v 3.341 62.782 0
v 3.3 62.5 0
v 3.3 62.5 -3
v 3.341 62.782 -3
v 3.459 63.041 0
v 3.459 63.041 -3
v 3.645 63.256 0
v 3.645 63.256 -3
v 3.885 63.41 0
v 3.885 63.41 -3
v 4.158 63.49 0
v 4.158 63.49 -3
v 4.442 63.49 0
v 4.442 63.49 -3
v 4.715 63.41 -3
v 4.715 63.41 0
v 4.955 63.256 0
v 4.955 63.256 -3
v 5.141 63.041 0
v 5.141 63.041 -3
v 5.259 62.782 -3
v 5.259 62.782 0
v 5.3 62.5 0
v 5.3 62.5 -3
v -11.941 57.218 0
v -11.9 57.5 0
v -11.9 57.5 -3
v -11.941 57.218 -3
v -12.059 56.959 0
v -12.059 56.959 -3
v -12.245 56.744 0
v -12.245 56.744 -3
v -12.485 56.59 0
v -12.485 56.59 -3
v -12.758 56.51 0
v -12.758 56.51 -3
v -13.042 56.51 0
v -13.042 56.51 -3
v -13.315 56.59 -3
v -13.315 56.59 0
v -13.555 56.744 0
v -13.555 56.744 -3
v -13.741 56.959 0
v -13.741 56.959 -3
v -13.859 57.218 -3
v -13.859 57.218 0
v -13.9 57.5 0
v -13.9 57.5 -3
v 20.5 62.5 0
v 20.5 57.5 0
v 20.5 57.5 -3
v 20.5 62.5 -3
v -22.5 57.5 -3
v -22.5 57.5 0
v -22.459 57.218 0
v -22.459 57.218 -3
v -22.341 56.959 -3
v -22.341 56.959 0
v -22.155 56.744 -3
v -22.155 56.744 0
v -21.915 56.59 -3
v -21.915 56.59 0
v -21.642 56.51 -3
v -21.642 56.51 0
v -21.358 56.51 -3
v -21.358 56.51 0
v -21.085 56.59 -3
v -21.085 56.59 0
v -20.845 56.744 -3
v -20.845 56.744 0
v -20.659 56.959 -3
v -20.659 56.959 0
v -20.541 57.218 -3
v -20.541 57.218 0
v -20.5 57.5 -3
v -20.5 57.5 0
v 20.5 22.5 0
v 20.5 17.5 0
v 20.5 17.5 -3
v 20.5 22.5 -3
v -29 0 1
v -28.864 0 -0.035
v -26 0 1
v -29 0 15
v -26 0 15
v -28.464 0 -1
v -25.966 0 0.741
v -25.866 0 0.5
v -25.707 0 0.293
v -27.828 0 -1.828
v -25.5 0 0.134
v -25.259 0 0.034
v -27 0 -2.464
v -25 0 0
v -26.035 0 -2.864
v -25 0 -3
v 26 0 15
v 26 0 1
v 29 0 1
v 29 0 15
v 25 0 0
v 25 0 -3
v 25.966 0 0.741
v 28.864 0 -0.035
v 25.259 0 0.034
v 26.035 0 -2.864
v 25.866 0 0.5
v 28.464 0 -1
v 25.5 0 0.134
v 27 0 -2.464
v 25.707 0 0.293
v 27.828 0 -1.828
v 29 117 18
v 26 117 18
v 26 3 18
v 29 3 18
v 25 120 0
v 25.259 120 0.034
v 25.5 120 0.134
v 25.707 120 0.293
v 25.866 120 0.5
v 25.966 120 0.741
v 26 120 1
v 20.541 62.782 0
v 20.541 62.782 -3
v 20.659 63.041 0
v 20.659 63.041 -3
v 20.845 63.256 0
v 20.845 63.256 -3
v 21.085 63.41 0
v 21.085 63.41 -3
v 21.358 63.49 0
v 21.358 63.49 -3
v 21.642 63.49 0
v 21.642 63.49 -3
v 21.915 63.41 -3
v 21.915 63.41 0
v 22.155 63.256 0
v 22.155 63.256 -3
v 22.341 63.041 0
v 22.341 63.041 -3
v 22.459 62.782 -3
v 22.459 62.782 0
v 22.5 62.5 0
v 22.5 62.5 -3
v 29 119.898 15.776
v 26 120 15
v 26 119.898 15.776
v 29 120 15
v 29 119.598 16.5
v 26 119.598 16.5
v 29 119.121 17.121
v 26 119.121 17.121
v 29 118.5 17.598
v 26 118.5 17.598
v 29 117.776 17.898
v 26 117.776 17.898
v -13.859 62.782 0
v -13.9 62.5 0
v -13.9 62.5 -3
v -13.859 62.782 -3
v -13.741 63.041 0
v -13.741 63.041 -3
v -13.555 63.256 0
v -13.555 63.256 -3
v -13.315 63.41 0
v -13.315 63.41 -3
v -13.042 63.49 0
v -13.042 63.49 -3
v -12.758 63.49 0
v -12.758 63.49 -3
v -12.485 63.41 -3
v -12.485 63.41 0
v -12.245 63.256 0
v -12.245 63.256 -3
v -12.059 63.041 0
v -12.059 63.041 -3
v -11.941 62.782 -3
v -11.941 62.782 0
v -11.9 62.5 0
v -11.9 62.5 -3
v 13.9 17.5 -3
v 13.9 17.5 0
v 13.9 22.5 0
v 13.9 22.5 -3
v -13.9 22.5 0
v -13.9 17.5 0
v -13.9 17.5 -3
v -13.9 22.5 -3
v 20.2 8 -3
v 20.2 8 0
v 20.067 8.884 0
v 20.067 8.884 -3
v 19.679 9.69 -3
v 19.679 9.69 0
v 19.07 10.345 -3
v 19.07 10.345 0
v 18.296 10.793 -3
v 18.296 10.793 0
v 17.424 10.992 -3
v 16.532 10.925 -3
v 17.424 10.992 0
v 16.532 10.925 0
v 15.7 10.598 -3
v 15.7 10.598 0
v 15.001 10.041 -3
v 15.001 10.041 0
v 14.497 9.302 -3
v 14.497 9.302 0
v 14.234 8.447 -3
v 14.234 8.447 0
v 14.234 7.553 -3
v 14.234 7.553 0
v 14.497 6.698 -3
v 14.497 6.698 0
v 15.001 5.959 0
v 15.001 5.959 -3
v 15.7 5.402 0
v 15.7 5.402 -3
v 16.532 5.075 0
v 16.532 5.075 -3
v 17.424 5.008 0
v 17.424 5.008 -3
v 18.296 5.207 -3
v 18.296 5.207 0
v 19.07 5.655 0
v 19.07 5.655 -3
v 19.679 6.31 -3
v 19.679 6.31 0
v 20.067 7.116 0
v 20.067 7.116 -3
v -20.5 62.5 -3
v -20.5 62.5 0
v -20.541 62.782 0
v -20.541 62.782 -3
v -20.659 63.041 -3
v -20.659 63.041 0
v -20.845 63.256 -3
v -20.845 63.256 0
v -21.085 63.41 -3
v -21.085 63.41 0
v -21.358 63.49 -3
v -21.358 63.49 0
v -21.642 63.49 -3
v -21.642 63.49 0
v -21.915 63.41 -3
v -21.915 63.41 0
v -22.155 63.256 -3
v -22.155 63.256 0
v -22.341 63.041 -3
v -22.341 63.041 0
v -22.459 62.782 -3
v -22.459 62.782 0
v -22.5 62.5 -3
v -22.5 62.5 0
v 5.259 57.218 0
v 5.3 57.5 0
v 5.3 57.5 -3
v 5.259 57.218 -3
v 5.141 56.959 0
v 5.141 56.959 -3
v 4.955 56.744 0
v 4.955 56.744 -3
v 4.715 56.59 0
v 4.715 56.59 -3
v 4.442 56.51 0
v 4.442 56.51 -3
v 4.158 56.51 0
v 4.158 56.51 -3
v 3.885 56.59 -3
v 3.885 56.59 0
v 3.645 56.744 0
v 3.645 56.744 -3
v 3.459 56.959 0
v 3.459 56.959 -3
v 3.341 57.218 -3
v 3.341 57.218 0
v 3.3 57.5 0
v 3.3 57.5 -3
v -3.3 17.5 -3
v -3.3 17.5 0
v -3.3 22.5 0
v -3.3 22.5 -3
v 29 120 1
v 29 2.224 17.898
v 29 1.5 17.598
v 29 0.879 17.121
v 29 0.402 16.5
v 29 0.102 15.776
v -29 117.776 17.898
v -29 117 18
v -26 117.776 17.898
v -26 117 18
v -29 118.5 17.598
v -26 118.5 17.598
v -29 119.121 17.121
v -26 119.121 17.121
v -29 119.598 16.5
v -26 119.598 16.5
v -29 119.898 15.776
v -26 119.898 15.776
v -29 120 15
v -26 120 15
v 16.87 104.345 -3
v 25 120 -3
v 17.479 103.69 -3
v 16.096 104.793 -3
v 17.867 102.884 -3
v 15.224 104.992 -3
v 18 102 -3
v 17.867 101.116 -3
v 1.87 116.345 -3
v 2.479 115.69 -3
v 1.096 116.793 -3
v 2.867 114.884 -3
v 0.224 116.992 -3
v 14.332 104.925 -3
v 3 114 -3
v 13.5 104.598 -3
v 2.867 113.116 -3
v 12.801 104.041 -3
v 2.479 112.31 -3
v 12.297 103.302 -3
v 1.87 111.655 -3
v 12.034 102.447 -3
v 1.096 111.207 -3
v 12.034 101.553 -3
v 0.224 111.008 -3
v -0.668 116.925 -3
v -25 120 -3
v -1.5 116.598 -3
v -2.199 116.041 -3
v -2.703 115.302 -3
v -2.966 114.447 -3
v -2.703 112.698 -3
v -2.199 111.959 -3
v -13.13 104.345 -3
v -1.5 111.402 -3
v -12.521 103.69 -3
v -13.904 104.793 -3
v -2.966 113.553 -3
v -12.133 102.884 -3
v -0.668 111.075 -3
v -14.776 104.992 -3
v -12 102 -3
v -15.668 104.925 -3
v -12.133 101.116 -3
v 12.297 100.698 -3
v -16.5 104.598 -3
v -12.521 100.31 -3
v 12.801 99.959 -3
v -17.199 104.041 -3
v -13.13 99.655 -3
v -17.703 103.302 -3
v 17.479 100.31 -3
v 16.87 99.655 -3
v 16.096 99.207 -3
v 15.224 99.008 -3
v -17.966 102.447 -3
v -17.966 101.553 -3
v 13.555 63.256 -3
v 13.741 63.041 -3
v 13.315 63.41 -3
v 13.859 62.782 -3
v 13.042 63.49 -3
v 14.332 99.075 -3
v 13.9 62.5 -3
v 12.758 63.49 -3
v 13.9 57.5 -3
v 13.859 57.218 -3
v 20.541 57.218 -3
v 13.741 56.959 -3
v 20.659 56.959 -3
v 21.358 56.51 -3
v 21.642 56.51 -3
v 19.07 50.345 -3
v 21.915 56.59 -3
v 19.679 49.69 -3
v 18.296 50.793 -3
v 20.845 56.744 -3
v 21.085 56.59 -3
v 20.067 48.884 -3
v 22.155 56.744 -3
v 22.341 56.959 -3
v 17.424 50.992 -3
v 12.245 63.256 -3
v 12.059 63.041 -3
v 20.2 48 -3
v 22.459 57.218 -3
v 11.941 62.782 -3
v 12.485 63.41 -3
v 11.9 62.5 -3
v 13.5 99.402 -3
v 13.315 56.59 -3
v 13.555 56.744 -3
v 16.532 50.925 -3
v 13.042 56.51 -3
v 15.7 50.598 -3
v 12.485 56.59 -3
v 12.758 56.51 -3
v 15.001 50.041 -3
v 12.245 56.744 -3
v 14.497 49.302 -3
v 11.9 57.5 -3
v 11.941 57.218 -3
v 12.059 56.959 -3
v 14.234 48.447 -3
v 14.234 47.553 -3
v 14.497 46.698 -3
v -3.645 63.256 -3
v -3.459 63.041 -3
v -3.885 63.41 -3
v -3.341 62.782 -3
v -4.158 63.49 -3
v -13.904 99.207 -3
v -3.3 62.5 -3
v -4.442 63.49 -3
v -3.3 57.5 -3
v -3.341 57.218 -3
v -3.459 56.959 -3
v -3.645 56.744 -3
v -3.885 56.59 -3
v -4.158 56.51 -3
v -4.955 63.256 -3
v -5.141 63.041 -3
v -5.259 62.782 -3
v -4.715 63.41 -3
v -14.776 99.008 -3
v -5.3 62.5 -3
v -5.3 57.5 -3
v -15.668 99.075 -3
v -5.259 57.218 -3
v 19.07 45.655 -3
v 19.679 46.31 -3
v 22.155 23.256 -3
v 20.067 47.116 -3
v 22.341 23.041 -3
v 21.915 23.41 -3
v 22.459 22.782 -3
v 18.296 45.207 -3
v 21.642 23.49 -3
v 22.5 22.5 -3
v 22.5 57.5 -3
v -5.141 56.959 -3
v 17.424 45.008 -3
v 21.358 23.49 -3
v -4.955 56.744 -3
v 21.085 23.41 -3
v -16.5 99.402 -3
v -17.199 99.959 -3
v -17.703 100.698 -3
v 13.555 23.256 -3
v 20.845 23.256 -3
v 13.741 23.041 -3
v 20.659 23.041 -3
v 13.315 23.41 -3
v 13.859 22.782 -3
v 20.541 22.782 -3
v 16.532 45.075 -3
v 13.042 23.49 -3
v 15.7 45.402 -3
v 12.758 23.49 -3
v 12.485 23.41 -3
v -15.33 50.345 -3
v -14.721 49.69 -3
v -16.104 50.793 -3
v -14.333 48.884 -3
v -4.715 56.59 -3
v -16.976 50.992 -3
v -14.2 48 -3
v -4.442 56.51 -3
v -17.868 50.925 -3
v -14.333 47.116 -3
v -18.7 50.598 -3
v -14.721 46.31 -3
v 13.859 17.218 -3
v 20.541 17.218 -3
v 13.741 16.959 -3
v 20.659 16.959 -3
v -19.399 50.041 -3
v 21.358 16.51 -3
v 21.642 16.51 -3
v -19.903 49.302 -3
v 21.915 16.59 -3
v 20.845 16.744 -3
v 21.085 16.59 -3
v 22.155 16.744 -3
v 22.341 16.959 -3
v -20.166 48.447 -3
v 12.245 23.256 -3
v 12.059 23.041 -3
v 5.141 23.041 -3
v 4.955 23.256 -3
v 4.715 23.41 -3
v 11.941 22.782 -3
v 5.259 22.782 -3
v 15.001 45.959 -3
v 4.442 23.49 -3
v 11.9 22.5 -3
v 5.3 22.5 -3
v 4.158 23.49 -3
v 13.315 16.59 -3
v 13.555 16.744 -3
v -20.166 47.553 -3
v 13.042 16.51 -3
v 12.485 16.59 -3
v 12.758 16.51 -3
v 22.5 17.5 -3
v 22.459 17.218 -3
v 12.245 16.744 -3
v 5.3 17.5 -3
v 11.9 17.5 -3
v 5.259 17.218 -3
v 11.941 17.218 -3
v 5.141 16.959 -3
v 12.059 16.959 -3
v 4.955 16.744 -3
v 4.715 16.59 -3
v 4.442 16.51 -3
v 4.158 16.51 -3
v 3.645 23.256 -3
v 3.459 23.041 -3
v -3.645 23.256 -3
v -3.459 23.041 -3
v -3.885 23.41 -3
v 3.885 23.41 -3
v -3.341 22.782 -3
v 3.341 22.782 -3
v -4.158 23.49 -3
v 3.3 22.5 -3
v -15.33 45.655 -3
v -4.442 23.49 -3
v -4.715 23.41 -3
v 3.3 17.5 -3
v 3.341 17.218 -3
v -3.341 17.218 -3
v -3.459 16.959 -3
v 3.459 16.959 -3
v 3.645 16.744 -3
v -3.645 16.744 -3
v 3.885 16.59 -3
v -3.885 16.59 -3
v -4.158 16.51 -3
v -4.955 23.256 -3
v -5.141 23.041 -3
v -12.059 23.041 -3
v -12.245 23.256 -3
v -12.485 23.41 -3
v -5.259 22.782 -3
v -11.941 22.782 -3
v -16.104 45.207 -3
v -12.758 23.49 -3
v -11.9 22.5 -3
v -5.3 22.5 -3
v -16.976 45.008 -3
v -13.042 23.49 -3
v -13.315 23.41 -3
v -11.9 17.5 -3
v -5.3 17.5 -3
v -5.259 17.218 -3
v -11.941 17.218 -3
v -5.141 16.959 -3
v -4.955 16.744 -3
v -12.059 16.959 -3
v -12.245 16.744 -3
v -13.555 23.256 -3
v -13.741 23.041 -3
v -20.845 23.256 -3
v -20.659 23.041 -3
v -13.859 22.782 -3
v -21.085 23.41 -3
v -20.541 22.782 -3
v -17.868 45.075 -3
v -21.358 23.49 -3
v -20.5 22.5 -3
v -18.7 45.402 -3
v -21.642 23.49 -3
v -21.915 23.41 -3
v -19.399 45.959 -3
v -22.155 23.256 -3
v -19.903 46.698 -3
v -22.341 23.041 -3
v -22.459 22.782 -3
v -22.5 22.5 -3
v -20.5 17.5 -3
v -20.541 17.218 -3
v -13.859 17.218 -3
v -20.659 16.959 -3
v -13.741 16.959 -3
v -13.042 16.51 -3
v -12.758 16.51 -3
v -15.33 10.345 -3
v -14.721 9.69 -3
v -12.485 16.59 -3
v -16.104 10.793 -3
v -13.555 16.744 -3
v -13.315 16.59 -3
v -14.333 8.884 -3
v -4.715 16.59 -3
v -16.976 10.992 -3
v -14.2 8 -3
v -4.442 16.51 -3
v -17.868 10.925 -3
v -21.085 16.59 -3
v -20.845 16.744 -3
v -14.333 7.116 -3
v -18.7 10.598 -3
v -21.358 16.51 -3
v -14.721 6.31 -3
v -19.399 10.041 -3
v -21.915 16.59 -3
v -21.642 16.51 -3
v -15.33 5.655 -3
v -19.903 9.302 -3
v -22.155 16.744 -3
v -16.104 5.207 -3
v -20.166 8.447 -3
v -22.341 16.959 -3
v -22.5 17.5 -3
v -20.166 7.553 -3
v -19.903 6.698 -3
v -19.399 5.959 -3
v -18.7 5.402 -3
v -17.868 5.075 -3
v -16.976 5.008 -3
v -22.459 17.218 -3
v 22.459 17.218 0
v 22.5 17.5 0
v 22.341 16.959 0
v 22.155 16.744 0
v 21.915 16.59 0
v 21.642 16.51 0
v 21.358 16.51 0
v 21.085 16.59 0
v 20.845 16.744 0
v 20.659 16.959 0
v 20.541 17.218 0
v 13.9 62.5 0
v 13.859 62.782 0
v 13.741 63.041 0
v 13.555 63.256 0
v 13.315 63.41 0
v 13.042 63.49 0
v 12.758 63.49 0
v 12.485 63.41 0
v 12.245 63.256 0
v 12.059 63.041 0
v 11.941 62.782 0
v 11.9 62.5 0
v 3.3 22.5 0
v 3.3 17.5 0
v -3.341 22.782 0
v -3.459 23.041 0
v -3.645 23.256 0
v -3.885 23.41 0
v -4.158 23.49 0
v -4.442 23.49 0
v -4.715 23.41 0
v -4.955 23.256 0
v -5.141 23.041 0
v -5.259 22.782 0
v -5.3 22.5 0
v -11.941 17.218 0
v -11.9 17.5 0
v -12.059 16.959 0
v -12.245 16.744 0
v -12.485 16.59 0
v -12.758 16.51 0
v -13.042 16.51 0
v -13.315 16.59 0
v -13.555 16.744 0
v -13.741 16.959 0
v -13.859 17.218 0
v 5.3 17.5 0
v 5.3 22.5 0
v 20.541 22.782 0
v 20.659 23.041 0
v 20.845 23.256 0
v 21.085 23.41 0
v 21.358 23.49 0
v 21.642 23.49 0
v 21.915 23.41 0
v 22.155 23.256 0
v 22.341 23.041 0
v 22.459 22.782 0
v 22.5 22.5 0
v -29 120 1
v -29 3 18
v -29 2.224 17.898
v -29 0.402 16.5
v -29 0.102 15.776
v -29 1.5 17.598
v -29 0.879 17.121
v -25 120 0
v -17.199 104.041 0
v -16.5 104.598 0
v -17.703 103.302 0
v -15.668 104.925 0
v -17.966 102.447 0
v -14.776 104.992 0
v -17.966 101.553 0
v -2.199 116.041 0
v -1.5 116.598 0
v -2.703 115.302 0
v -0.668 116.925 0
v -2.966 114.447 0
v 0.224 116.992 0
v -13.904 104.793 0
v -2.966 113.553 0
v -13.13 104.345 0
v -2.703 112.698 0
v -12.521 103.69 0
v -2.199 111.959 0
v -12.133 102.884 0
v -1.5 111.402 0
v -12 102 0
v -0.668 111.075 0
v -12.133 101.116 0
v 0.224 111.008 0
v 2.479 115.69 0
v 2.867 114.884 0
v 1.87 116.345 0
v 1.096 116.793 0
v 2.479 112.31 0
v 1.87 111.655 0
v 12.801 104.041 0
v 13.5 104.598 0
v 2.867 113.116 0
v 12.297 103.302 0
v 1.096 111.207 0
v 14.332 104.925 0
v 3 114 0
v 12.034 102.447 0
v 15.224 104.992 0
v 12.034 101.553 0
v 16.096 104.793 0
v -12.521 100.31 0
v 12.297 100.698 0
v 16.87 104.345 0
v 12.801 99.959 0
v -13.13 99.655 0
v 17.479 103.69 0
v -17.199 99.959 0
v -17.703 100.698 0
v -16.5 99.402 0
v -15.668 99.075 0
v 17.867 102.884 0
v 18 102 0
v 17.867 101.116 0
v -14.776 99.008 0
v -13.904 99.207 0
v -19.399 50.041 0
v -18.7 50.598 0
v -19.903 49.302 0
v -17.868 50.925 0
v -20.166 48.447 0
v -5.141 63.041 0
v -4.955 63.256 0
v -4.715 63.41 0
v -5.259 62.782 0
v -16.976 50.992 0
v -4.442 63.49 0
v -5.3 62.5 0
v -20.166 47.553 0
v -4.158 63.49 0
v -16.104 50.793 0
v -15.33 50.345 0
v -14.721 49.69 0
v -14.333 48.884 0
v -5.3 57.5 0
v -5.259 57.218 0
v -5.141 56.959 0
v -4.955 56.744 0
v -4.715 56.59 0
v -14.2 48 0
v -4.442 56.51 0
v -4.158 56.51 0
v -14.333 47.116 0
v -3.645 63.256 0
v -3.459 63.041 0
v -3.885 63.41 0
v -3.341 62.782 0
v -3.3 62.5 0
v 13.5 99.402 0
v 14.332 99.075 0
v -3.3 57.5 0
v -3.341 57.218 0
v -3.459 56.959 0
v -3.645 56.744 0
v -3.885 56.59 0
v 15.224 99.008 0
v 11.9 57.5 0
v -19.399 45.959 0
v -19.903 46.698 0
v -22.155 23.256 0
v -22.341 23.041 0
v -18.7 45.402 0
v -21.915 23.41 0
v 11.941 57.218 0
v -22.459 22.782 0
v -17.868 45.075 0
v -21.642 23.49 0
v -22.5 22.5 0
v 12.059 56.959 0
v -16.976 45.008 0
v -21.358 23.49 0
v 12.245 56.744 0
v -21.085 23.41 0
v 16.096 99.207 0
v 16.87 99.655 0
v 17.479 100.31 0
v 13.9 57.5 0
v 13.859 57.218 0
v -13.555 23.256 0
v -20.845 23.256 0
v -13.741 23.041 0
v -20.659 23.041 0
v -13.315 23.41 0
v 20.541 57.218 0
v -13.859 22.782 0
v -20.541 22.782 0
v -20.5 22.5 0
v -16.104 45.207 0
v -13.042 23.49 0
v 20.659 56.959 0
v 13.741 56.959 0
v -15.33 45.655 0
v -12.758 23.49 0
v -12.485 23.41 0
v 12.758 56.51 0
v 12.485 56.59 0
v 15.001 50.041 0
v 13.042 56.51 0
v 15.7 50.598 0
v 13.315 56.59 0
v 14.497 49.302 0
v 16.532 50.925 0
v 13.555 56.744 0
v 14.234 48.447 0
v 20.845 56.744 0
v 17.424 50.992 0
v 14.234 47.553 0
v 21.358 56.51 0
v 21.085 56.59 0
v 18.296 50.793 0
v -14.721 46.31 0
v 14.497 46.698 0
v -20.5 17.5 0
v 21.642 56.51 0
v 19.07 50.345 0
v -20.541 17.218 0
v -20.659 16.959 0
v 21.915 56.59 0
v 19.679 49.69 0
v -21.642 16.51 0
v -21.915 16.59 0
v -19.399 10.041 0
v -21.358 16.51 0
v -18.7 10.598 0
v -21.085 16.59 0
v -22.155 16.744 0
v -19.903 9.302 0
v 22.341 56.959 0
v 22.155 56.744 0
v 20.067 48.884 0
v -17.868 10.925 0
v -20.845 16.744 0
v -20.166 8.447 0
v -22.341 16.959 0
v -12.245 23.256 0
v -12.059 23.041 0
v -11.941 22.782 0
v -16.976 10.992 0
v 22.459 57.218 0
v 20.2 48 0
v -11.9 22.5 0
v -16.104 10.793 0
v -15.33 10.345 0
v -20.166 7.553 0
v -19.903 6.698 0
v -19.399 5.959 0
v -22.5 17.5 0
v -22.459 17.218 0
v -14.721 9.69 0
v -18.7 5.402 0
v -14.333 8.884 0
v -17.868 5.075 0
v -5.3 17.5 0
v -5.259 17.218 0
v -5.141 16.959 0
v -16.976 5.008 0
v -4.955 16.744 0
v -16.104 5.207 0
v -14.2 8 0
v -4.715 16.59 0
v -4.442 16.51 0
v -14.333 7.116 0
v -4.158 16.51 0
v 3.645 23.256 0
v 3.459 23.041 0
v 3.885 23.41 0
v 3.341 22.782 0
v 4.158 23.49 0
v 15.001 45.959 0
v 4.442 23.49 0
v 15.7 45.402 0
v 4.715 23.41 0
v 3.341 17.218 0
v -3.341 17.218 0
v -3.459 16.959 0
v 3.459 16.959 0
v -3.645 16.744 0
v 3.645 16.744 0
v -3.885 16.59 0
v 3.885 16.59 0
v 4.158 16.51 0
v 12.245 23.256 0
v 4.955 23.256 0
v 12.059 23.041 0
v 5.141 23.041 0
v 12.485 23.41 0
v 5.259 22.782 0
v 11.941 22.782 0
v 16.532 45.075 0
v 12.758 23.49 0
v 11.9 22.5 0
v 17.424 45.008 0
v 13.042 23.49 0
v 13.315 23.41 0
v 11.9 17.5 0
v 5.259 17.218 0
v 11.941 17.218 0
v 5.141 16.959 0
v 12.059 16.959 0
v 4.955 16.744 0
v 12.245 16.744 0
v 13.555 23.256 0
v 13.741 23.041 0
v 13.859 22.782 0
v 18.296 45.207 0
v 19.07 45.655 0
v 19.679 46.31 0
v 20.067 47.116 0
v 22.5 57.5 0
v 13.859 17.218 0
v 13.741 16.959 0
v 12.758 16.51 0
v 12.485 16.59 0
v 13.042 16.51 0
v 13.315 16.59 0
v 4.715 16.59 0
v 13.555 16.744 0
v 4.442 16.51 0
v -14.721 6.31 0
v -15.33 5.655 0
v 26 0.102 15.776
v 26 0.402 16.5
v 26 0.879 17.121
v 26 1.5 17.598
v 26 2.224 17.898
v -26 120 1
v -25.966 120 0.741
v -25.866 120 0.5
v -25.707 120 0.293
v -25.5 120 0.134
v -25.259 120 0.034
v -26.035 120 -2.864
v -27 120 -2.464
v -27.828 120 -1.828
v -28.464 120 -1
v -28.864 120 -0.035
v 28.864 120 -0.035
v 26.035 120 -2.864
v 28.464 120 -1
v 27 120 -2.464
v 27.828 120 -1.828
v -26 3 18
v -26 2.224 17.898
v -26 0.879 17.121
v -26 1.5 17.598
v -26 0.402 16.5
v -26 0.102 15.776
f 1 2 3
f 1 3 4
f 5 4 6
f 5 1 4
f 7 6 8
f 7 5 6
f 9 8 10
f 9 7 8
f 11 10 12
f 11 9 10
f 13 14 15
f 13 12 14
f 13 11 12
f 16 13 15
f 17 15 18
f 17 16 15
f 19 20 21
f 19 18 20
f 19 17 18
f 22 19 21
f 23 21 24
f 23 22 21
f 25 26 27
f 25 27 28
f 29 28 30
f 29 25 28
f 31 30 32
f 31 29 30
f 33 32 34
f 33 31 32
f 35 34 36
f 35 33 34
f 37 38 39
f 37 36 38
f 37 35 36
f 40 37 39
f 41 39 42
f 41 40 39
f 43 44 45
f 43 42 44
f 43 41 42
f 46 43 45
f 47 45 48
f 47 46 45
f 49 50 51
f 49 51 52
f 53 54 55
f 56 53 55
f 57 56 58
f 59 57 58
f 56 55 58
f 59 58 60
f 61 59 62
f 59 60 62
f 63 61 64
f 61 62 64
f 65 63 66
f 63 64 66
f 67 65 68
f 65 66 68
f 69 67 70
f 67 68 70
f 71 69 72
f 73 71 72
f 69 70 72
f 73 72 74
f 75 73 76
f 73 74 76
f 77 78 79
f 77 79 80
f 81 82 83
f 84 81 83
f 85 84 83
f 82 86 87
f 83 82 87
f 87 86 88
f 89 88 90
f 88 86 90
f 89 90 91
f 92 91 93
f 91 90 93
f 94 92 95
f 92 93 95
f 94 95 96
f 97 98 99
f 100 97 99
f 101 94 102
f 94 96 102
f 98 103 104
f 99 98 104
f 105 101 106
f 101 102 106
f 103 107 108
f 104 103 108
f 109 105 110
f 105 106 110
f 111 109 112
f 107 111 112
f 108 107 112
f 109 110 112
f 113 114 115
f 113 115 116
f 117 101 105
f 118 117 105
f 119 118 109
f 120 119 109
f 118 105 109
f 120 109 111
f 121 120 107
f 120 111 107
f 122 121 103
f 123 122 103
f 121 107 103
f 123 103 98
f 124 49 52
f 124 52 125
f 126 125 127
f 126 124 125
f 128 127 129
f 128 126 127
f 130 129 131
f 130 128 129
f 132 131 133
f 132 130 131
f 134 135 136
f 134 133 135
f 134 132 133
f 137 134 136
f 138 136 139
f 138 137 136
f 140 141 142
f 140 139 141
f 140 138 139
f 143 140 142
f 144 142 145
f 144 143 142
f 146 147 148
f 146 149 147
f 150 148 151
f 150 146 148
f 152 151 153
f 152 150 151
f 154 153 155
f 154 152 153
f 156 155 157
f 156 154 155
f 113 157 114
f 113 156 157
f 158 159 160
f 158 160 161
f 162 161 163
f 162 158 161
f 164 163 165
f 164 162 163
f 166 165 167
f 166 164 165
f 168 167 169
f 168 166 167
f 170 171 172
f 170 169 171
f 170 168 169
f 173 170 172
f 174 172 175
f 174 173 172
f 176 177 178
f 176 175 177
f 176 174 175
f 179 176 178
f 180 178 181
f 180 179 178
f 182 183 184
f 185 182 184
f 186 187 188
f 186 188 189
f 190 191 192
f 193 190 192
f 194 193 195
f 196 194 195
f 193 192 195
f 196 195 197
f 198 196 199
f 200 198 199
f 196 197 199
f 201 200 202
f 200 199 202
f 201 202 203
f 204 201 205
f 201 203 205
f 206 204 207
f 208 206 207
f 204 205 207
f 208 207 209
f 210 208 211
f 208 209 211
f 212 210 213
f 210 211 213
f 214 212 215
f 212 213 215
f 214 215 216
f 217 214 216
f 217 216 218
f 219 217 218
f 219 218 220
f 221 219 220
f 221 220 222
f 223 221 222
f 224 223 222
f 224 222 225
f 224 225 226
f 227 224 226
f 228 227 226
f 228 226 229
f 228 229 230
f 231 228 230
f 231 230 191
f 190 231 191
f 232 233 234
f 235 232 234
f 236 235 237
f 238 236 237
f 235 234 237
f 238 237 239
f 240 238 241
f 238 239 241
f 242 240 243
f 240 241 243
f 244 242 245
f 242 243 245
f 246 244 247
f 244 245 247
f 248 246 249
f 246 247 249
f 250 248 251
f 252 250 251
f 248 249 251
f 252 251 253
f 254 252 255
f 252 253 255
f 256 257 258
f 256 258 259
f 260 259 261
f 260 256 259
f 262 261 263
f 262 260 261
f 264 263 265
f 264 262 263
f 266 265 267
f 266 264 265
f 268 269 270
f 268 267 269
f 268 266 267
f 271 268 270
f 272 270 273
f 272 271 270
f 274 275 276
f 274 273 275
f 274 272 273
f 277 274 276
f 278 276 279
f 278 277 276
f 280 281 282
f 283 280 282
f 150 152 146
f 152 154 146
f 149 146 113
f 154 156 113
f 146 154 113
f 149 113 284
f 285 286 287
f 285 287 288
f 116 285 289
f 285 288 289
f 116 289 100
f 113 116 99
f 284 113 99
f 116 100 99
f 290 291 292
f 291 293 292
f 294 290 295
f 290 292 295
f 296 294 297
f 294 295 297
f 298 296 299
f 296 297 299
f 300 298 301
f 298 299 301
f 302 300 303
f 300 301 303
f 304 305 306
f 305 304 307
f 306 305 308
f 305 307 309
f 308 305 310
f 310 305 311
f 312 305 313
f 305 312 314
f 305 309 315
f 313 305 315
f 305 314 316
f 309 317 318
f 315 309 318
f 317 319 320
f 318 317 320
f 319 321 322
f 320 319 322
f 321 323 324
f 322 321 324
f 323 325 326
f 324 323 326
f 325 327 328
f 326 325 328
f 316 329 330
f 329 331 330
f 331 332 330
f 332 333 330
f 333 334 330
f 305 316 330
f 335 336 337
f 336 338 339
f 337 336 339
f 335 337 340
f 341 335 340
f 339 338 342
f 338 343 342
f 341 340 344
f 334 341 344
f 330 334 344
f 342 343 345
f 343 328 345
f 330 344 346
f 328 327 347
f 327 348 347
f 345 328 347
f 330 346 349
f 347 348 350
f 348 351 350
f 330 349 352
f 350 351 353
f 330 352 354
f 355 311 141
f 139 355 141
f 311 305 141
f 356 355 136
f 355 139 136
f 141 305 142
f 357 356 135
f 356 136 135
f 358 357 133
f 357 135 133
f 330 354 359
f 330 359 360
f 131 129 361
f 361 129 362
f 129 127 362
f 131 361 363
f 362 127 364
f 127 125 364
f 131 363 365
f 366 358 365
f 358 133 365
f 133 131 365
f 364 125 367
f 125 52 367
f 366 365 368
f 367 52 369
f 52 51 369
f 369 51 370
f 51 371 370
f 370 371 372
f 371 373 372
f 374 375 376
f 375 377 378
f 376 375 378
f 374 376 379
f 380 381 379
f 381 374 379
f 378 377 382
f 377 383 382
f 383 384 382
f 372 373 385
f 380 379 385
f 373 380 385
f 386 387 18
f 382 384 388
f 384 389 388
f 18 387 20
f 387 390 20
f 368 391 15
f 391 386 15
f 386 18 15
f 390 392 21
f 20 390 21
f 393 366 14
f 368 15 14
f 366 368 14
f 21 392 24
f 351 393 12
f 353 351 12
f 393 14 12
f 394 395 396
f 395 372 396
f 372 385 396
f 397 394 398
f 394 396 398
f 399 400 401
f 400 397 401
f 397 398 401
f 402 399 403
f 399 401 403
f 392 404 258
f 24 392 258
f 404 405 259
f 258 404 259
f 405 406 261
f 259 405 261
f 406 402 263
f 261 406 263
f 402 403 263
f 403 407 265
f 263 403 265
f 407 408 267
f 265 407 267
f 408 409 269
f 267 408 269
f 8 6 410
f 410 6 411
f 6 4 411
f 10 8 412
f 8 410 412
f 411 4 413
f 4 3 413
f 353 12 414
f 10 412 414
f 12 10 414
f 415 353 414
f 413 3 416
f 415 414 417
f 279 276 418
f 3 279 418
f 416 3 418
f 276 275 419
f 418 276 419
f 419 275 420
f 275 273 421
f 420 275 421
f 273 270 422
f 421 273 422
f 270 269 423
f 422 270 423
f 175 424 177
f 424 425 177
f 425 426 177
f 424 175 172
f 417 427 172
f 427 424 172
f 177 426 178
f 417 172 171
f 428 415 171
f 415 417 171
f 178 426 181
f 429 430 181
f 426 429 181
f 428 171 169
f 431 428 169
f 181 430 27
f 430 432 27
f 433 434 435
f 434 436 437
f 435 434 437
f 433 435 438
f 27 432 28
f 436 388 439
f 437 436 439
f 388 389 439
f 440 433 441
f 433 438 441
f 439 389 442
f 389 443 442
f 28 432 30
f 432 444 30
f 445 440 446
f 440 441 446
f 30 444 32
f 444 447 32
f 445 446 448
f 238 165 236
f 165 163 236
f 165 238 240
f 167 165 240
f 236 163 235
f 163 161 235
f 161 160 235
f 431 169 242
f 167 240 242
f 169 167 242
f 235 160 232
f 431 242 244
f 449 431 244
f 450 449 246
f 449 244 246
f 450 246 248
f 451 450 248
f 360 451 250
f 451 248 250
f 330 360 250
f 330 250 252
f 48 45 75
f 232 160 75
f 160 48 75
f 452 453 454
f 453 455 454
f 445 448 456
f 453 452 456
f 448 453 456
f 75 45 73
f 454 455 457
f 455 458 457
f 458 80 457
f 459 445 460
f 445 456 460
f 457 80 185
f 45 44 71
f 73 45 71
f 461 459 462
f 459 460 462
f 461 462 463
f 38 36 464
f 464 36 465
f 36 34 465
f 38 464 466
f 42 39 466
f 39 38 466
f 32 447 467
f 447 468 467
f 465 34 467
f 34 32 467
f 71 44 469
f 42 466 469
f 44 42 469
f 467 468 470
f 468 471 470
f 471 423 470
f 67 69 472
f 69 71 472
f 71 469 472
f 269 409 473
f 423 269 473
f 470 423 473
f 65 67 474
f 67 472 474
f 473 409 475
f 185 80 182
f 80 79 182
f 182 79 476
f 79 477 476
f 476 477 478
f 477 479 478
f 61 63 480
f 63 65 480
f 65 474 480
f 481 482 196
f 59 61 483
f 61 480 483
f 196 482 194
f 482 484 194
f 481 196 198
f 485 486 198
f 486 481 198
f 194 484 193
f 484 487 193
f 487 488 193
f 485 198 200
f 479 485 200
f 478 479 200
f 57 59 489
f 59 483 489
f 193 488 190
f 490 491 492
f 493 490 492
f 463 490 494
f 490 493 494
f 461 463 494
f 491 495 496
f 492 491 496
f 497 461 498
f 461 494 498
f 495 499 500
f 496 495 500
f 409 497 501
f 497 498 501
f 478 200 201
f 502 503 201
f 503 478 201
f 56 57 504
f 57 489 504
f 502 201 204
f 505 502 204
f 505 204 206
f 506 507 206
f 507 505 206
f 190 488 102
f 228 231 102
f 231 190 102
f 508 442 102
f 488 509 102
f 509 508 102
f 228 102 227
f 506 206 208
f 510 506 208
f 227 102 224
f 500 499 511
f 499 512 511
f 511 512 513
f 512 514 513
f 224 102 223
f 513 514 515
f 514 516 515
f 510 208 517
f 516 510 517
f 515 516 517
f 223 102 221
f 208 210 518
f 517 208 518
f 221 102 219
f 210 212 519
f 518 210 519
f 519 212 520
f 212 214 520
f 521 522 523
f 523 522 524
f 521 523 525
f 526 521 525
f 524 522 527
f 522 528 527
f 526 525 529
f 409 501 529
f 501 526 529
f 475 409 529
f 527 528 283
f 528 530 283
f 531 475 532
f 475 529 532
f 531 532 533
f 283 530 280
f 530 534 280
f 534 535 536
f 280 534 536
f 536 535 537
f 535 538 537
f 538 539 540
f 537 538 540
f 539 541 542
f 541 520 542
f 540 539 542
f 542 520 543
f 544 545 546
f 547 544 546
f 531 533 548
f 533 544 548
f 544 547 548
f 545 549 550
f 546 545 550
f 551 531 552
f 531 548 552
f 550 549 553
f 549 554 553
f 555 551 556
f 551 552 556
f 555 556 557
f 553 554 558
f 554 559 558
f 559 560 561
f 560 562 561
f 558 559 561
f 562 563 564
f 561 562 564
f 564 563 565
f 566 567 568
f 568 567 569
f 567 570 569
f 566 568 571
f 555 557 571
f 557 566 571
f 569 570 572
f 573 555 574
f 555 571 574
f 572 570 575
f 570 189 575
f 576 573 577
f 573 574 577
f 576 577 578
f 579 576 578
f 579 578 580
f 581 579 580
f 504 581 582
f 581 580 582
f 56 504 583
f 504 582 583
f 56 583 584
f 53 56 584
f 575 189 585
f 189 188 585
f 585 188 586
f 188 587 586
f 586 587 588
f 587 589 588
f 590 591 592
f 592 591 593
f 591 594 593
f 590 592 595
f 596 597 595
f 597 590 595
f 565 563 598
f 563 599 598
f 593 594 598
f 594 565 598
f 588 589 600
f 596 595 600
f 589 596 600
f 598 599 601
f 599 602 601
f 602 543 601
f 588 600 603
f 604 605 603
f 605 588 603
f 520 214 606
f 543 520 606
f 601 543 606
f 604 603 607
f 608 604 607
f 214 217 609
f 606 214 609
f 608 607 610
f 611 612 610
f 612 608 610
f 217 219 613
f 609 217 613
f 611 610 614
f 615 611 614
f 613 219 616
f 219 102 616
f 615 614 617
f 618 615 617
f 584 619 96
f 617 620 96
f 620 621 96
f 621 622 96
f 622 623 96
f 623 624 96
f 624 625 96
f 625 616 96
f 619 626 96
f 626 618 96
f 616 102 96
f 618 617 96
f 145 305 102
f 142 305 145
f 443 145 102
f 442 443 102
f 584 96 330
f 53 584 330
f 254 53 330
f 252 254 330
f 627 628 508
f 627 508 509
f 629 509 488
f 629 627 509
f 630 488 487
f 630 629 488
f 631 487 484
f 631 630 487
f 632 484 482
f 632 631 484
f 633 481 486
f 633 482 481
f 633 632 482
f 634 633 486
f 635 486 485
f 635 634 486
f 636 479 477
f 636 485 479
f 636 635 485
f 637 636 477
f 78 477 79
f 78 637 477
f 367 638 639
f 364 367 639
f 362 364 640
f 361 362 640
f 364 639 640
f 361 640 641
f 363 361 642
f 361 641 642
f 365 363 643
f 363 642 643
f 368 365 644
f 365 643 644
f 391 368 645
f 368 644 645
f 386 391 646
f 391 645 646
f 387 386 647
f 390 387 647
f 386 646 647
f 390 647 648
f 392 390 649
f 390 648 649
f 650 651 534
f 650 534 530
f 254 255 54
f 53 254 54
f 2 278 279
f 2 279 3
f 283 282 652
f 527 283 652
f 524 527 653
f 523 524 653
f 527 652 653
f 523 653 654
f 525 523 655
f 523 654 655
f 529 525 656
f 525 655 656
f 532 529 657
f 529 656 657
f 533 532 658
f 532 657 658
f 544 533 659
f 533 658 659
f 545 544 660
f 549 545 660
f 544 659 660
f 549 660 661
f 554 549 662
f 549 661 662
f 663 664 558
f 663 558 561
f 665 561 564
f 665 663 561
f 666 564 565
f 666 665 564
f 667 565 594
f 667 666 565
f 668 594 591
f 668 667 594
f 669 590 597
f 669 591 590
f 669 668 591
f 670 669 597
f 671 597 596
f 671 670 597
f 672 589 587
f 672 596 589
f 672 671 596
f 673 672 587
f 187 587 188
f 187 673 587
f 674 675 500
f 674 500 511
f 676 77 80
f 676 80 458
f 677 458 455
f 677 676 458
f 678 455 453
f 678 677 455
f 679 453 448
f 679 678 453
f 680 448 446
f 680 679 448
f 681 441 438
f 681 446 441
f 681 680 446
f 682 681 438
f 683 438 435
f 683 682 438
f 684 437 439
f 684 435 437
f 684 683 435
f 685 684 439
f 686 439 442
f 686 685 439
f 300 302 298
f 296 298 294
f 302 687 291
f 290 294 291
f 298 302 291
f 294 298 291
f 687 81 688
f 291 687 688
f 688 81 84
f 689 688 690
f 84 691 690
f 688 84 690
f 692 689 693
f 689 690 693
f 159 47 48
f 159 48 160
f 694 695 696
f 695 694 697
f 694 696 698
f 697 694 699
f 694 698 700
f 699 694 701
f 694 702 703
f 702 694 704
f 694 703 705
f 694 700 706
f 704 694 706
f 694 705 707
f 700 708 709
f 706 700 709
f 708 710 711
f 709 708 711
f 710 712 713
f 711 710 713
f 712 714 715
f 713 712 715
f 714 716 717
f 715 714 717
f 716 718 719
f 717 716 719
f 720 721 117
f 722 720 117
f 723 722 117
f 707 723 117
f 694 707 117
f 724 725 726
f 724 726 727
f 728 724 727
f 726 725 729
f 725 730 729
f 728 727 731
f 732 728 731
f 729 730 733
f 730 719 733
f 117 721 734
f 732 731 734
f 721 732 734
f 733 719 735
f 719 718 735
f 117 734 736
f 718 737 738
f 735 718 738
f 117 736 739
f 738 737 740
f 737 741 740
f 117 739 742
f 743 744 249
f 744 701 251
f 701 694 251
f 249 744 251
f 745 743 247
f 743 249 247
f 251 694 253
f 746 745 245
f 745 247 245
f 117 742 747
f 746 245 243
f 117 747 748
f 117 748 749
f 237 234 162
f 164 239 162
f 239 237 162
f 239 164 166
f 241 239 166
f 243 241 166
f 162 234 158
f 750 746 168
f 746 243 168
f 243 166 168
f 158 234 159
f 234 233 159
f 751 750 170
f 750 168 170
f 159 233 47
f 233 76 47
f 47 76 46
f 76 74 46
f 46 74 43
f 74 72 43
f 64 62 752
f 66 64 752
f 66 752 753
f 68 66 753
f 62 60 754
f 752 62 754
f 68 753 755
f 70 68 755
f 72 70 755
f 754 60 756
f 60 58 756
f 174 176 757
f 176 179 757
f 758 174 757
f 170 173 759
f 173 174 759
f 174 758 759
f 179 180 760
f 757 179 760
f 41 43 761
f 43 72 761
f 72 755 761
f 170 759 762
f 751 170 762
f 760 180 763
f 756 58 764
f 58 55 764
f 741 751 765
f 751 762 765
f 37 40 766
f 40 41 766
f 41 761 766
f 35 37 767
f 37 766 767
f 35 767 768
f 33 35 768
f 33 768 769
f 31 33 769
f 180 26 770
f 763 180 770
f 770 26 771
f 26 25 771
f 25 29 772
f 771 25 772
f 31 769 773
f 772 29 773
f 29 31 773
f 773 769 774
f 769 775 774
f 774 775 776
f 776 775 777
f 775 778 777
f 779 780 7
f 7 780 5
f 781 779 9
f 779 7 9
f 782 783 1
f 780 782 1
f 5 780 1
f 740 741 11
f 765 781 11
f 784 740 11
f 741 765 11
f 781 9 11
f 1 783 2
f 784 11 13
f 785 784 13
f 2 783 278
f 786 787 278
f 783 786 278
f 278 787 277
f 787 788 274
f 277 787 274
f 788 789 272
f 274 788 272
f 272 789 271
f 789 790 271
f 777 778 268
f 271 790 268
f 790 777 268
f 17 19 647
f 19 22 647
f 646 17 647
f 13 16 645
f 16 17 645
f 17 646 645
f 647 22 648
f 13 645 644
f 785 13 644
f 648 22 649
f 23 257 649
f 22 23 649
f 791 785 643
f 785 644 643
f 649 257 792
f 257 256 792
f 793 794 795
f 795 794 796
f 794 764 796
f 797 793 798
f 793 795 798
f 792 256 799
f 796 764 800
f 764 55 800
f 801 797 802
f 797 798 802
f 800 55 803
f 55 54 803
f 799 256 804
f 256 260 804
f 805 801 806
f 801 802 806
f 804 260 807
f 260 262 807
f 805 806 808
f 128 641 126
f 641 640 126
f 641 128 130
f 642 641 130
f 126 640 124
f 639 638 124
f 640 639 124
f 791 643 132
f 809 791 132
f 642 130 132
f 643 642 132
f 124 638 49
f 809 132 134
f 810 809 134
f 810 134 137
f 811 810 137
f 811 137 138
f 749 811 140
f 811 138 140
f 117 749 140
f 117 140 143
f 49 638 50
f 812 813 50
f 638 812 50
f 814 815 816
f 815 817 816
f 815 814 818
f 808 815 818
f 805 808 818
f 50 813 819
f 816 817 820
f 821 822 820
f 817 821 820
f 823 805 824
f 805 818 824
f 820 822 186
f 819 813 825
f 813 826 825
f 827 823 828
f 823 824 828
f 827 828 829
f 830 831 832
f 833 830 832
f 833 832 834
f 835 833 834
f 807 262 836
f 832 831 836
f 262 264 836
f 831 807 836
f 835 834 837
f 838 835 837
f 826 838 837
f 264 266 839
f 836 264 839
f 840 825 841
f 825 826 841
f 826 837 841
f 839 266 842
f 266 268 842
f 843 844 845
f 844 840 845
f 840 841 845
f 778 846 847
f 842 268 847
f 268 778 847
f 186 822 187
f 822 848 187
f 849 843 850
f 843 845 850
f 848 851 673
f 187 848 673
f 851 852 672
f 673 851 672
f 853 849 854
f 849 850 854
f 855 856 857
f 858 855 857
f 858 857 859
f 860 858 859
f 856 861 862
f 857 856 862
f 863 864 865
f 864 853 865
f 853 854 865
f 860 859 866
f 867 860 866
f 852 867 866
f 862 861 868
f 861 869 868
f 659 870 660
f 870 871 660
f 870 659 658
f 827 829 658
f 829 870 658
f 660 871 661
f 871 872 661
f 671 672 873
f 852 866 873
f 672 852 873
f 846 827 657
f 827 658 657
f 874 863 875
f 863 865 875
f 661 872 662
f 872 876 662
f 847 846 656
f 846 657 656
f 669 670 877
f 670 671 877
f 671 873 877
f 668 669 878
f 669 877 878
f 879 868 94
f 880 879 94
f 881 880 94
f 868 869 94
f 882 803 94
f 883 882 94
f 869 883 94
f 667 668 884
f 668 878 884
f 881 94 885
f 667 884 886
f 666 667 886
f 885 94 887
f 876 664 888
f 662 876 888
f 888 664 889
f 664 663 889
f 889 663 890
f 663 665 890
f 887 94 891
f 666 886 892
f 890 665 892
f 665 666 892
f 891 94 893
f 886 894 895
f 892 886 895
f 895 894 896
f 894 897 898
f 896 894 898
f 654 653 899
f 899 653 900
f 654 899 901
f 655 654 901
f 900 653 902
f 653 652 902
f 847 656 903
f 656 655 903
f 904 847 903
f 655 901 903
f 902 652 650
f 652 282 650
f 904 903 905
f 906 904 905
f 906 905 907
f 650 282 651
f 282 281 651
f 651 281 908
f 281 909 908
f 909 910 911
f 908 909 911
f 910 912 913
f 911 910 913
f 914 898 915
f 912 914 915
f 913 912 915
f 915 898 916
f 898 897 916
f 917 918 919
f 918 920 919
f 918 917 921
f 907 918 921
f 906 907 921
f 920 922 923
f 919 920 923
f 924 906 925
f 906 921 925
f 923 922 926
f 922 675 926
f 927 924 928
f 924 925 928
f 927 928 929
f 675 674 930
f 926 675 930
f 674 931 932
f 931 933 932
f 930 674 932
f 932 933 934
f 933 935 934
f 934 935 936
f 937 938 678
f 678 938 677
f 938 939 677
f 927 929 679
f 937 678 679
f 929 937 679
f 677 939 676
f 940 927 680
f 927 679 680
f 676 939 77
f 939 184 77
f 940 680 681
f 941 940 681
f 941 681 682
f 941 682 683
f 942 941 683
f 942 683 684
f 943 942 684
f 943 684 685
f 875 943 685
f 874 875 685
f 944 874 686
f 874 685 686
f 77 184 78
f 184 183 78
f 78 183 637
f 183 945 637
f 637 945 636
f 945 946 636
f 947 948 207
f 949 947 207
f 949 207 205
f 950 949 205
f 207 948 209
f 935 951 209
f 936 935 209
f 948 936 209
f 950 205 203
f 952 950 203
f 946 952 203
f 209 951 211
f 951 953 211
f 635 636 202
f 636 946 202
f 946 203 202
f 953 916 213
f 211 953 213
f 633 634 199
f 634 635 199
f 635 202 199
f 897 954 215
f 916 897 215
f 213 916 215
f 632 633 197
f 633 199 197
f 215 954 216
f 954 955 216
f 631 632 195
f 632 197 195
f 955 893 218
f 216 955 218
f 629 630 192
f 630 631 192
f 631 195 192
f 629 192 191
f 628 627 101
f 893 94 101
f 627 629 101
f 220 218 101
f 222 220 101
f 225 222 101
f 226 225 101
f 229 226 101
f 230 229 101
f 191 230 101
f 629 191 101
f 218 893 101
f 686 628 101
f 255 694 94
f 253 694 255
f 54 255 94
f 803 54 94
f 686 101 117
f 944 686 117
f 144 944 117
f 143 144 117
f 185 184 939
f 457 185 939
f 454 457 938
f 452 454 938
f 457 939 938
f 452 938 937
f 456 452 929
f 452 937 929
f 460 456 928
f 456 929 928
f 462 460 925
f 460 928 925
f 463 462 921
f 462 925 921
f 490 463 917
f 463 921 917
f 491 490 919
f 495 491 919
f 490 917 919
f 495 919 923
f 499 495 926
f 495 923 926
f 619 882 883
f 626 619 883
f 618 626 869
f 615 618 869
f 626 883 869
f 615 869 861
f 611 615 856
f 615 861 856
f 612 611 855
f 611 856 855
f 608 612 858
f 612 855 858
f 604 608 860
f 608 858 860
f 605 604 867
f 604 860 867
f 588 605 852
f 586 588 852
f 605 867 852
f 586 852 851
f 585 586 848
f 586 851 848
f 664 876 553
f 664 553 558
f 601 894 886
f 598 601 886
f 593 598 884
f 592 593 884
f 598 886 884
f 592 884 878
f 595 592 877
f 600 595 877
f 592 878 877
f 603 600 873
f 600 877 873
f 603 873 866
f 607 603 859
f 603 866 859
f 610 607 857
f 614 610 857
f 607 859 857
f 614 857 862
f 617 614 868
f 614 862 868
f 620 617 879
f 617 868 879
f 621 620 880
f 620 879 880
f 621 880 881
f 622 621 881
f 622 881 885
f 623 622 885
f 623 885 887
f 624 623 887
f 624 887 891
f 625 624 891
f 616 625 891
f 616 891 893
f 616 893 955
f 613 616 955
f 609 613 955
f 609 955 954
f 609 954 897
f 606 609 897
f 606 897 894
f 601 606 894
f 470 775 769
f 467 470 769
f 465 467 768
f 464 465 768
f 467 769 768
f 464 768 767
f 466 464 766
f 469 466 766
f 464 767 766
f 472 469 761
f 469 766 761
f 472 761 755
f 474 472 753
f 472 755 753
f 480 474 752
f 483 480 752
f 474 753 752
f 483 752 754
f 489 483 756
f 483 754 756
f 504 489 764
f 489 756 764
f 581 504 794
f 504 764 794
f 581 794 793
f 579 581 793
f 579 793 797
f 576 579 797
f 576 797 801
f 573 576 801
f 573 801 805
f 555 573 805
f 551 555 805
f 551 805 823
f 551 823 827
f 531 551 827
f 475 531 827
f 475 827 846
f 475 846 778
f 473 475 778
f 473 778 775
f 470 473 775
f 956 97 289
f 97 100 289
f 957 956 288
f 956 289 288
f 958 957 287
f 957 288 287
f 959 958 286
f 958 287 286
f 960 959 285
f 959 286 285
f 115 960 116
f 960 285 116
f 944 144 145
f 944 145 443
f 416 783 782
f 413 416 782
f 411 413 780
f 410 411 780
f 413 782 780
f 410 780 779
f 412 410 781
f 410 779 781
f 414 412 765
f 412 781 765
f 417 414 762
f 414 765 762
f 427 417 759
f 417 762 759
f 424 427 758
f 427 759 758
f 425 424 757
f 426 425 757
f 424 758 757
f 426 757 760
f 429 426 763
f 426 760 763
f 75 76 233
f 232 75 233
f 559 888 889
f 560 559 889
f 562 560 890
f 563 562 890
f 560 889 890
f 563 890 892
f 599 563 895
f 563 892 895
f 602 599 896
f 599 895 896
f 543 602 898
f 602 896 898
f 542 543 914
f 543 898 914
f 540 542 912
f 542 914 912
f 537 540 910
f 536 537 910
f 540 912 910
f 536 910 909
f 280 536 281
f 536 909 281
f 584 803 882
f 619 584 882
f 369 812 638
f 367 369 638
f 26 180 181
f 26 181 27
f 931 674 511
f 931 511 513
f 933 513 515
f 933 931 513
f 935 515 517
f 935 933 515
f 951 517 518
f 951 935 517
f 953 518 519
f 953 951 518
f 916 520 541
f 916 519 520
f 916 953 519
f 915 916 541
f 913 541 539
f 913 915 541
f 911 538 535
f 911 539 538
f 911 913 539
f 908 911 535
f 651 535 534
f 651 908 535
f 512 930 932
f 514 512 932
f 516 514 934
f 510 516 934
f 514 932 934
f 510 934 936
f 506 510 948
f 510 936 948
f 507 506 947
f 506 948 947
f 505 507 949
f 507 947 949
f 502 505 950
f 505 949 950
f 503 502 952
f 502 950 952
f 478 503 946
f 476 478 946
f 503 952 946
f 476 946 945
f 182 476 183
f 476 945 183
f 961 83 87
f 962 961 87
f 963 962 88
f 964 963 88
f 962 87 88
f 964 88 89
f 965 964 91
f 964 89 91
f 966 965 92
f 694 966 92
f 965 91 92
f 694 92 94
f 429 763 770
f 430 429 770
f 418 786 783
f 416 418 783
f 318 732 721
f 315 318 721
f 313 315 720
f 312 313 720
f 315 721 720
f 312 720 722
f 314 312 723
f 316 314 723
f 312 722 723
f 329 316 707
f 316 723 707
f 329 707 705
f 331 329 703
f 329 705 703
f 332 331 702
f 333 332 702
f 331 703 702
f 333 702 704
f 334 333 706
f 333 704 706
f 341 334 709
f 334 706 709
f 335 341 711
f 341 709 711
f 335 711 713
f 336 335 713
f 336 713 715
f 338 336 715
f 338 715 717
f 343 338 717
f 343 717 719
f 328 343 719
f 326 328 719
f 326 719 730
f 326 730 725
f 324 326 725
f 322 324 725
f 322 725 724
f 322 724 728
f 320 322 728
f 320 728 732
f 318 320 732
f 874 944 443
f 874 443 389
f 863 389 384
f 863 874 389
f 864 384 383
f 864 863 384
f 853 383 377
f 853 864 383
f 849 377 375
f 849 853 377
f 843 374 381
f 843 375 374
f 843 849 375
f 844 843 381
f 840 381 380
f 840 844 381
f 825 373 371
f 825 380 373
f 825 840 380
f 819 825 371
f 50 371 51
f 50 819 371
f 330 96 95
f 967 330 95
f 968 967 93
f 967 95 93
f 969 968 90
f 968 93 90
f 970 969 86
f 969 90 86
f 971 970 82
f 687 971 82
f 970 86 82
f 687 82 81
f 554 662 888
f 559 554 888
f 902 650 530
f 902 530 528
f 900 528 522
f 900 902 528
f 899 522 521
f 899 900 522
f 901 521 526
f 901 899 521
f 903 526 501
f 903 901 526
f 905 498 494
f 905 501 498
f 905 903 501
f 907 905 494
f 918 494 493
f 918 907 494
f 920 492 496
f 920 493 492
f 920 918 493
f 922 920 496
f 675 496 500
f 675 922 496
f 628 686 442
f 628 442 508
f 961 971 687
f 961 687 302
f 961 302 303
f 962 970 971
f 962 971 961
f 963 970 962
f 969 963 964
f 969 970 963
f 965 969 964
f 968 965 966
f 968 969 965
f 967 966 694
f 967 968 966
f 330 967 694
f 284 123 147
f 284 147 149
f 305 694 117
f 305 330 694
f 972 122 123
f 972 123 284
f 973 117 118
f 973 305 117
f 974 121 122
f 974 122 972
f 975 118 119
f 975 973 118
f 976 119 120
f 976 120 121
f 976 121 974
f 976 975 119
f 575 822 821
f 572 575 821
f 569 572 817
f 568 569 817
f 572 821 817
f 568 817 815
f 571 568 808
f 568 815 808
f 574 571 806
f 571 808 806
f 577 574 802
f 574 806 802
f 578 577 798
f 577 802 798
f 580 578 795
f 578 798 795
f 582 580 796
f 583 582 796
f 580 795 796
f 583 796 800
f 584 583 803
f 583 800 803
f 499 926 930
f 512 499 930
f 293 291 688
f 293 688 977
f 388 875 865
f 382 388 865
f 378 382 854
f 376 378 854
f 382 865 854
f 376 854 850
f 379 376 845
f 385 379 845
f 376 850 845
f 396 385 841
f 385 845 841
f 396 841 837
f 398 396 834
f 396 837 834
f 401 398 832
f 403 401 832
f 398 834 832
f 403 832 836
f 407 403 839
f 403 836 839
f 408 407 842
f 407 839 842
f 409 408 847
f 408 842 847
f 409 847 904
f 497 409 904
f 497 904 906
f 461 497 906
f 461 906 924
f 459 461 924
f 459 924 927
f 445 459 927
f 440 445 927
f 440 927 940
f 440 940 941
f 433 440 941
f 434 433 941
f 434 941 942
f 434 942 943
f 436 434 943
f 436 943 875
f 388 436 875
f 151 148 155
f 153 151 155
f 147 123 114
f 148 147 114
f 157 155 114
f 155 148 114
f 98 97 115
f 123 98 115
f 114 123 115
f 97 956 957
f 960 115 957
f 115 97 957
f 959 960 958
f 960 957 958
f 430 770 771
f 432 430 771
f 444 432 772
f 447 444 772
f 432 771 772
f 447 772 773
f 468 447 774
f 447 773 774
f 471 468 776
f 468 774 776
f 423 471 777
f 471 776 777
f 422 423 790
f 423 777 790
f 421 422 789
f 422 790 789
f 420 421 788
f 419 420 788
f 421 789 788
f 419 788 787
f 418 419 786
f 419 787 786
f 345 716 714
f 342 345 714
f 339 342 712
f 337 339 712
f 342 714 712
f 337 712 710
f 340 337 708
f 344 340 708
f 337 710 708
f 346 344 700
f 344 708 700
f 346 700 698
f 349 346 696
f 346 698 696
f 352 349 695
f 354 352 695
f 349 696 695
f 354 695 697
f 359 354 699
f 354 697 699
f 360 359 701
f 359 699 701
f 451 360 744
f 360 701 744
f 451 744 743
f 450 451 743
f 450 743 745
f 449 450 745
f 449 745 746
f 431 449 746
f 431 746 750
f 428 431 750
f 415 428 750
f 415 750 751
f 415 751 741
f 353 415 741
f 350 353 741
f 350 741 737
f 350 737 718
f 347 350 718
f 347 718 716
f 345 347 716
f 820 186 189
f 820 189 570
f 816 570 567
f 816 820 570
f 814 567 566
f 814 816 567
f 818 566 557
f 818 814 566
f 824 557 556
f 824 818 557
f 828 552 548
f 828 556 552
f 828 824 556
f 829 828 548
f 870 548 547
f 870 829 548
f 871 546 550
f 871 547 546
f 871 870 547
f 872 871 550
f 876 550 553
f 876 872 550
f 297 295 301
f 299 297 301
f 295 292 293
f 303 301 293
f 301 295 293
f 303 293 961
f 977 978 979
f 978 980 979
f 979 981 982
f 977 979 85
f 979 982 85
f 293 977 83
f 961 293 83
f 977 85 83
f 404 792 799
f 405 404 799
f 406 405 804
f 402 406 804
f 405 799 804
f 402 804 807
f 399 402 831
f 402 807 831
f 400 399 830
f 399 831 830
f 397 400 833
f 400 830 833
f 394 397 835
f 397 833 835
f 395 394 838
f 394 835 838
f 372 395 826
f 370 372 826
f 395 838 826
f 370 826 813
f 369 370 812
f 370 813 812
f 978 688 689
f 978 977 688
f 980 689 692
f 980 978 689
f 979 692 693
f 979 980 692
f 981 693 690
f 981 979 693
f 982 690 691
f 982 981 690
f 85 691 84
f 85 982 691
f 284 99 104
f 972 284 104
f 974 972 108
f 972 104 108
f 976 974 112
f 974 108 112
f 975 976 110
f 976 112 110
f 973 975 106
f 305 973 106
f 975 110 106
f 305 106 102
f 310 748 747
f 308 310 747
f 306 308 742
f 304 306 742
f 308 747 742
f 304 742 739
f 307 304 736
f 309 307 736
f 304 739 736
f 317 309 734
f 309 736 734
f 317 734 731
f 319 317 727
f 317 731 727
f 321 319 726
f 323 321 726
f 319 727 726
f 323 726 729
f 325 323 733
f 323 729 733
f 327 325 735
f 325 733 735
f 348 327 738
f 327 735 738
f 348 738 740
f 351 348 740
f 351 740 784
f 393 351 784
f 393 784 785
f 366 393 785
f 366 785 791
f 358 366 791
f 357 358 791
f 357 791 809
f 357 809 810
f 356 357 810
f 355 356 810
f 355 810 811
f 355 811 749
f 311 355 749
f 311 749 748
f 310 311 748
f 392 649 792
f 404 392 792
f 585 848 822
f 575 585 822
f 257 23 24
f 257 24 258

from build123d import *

# Parameters (mm, degrees)
BASE_FLANGE1_DEPTH = 120
CUT_EXTRUDE1_REACH = 126.76
SKETCH6_R          = 3
LPATTERN1_COUNT    = 2
LPATTERN1_PITCH    = 40
FILLET1_R          = 3
CUT_EXTRUDE2_REACH = 126.76
SKETCH7_R          = 3


# Sheet-metal steps are written as plain solids
with BuildPart() as part:
    # Sketch1 → Base-Flange1 (new body)
    with BuildSketch(Plane(origin=(0, 0, 0), x_dir=(1, 0, 0), z_dir=(0, 1, 0))):
        with BuildLine():
            Line((-26, -18), (-26, -1))
            ThreePointArc((-26, -1), (-25.707106781, -0.292893219), (-25, 0))
            Line((-25, 0), (25, 0))
            ThreePointArc((25, 0), (25.707106781, -0.292893219), (26, -1))
            Line((26, -1), (26, -18))
            Line((26, -18), (29, -18))
            Line((29, -18), (29, -1))
            ThreePointArc((29, -1), (27.828427125, 1.828427125), (25, 3))
            Line((25, 3), (-25, 3))
            ThreePointArc((-25, 3), (-27.828427125, 1.828427125), (-29, -1))
            Line((-29, -1), (-29, -18))
            Line((-29, -18), (-26, -18))
        make_face()
    extrude(amount=BASE_FLANGE1_DEPTH)

    # Sketch6 → Cut-Extrude1 (cut, up to next)
    with BuildSketch(Plane.XY, mode=Mode.PRIVATE) as cut_extrude1_sk1:
        with Locations((-17.2, 8)):
            Circle(SKETCH6_R)
    cut_extrude1_tool1 = extrude(cut_extrude1_sk1.sketch, amount=-CUT_EXTRUDE1_REACH, mode=Mode.PRIVATE) & part.part
    # Sketch6 → Cut-Extrude1 (cut, up to next)
    with BuildSketch(Plane.XY, mode=Mode.PRIVATE) as cut_extrude1_sk2:
        with Locations((17.2, 8)):
            Circle(SKETCH6_R)
    cut_extrude1_tool2 = extrude(cut_extrude1_sk2.sketch, amount=-CUT_EXTRUDE1_REACH, mode=Mode.PRIVATE) & part.part
    # Sketch6 → Cut-Extrude1 (cut, up to next)
    with BuildSketch(Plane.XY, mode=Mode.PRIVATE) as cut_extrude1_sk3:
        with BuildLine():
            Line((-11.9, 22.5), (-11.9, 17.5))
            ThreePointArc((-11.9, 17.5), (-12.9, 16.5), (-13.9, 17.5))
            Line((-13.9, 17.5), (-13.9, 22.5))
            ThreePointArc((-13.9, 22.5), (-12.9, 23.5), (-11.9, 22.5))
        make_face()
    cut_extrude1_tool3 = extrude(cut_extrude1_sk3.sketch, amount=-CUT_EXTRUDE1_REACH, mode=Mode.PRIVATE) & part.part
    # Sketch6 → Cut-Extrude1 (cut, up to next)
    with BuildSketch(Plane.XY, mode=Mode.PRIVATE) as cut_extrude1_sk4:
        with BuildLine():
            Line((-22.5, 22.5), (-22.5, 17.5))
            ThreePointArc((-22.5, 17.5), (-21.5, 16.5), (-20.5, 17.5))
            Line((-20.5, 17.5), (-20.5, 22.5))
            ThreePointArc((-20.5, 22.5), (-21.5, 23.5), (-22.5, 22.5))
        make_face()
    cut_extrude1_tool4 = extrude(cut_extrude1_sk4.sketch, amount=-CUT_EXTRUDE1_REACH, mode=Mode.PRIVATE) & part.part
    # Sketch6 → Cut-Extrude1 (cut, up to next)
    with BuildSketch(Plane.XY, mode=Mode.PRIVATE) as cut_extrude1_sk5:
        with BuildLine():
            Line((5.3, 22.5), (5.3, 17.5))
            ThreePointArc((5.3, 17.5), (4.3, 16.5), (3.3, 17.5))
            Line((3.3, 17.5), (3.3, 22.5))
            ThreePointArc((3.3, 22.5), (4.3, 23.5), (5.3, 22.5))
        make_face()
    cut_extrude1_tool5 = extrude(cut_extrude1_sk5.sketch, amount=-CUT_EXTRUDE1_REACH, mode=Mode.PRIVATE) & part.part
    # Sketch6 → Cut-Extrude1 (cut, up to next)
    with BuildSketch(Plane.XY, mode=Mode.PRIVATE) as cut_extrude1_sk6:
        with BuildLine():
            Line((-5.3, 22.5), (-5.3, 17.5))
            ThreePointArc((-5.3, 17.5), (-4.3, 16.5), (-3.3, 17.5))
            Line((-3.3, 17.5), (-3.3, 22.5))
            ThreePointArc((-3.3, 22.5), (-4.3, 23.5), (-5.3, 22.5))
        make_face()
    cut_extrude1_tool6 = extrude(cut_extrude1_sk6.sketch, amount=-CUT_EXTRUDE1_REACH, mode=Mode.PRIVATE) & part.part
    # Sketch6 → Cut-Extrude1 (cut, up to next)
    with BuildSketch(Plane.XY, mode=Mode.PRIVATE) as cut_extrude1_sk7:
        with BuildLine():
            Line((22.5, 22.5), (22.5, 17.5))
            ThreePointArc((22.5, 17.5), (21.5, 16.5), (20.5, 17.5))
            Line((20.5, 17.5), (20.5, 22.5))
            ThreePointArc((20.5, 22.5), (21.5, 23.5), (22.5, 22.5))
        make_face()
    cut_extrude1_tool7 = extrude(cut_extrude1_sk7.sketch, amount=-CUT_EXTRUDE1_REACH, mode=Mode.PRIVATE) & part.part
    # Sketch6 → Cut-Extrude1 (cut, up to next)
    with BuildSketch(Plane.XY, mode=Mode.PRIVATE) as cut_extrude1_sk8:
        with BuildLine():
            Line((11.9, 22.5), (11.9, 17.5))
            ThreePointArc((11.9, 17.5), (12.9, 16.5), (13.9, 17.5))
            Line((13.9, 17.5), (13.9, 22.5))
            ThreePointArc((13.9, 22.5), (12.9, 23.5), (11.9, 22.5))
        make_face()
    cut_extrude1_tool8 = extrude(cut_extrude1_sk8.sketch, amount=-CUT_EXTRUDE1_REACH, mode=Mode.PRIVATE) & part.part
    cut_extrude1_1 = cut_extrude1_tool1.solids().sort_by_distance((-17.2, 8, 0))[0]
    add(cut_extrude1_1, mode=Mode.SUBTRACT)
    cut_extrude1_2 = cut_extrude1_tool2.solids().sort_by_distance((17.2, 8, 0))[0]
    add(cut_extrude1_2, mode=Mode.SUBTRACT)
    cut_extrude1_3 = cut_extrude1_tool3.solids().sort_by_distance((-12.9, 20, 0))[0]
    add(cut_extrude1_3, mode=Mode.SUBTRACT)
    cut_extrude1_4 = cut_extrude1_tool4.solids().sort_by_distance((-21.5, 20, 0))[0]
    add(cut_extrude1_4, mode=Mode.SUBTRACT)
    cut_extrude1_5 = cut_extrude1_tool5.solids().sort_by_distance((4.3, 20, 0))[0]
    add(cut_extrude1_5, mode=Mode.SUBTRACT)
    cut_extrude1_6 = cut_extrude1_tool6.solids().sort_by_distance((-4.3, 20, 0))[0]
    add(cut_extrude1_6, mode=Mode.SUBTRACT)
    cut_extrude1_7 = cut_extrude1_tool7.solids().sort_by_distance((21.5, 20, 0))[0]
    add(cut_extrude1_7, mode=Mode.SUBTRACT)
    cut_extrude1_8 = cut_extrude1_tool8.solids().sort_by_distance((12.9, 20, 0))[0]
    add(cut_extrude1_8, mode=Mode.SUBTRACT)
    cut_extrude1 = cut_extrude1_1 + cut_extrude1_2 + cut_extrude1_3 + cut_extrude1_4 + cut_extrude1_5 + cut_extrude1_6 + cut_extrude1_7 + cut_extrude1_8  # Cut-Extrude1 as one shape, for the pattern or mirror that repeats it

    # LPattern1: Cut-Extrude1 ×2
    with Locations(*[(0, i * LPATTERN1_PITCH, 0) for i in range(1, LPATTERN1_COUNT)]):
        add(cut_extrude1, mode=Mode.SUBTRACT)

    # Fillet1
    fillet1_edges = [part.edges().sort_by_distance(p)[0] for p in [
        (27.5, 0, 18),
        (-27.5, 0, 18),
        (27.5, 120, 18),
        (-27.5, 120, 18),
    ]]
    fillet(fillet1_edges, radius=FILLET1_R)

    # Sketch7 → Cut-Extrude2 (cut, up to next)
    with BuildSketch(Plane.XY, mode=Mode.PRIVATE) as cut_extrude2_sk1:
        with Locations((0, 114)):
            Circle(SKETCH7_R)
    cut_extrude2_tool1 = extrude(cut_extrude2_sk1.sketch, amount=-CUT_EXTRUDE2_REACH, mode=Mode.PRIVATE) & part.part
    # Sketch7 → Cut-Extrude2 (cut, up to next)
    with BuildSketch(Plane.XY, mode=Mode.PRIVATE) as cut_extrude2_sk2:
        with Locations((-15, 102)):
            Circle(SKETCH7_R)
    cut_extrude2_tool2 = extrude(cut_extrude2_sk2.sketch, amount=-CUT_EXTRUDE2_REACH, mode=Mode.PRIVATE) & part.part
    # Sketch7 → Cut-Extrude2 (cut, up to next)
    with BuildSketch(Plane.XY, mode=Mode.PRIVATE) as cut_extrude2_sk3:
        with Locations((15, 102)):
            Circle(SKETCH7_R)
    cut_extrude2_tool3 = extrude(cut_extrude2_sk3.sketch, amount=-CUT_EXTRUDE2_REACH, mode=Mode.PRIVATE) & part.part
    add(cut_extrude2_tool1.solids().sort_by_distance((0, 114, 0))[0], mode=Mode.SUBTRACT)
    add(cut_extrude2_tool2.solids().sort_by_distance((-15, 102, 0))[0], mode=Mode.SUBTRACT)
    add(cut_extrude2_tool3.solids().sort_by_distance((15, 102, 0))[0], mode=Mode.SUBTRACT)


solid = part.part
